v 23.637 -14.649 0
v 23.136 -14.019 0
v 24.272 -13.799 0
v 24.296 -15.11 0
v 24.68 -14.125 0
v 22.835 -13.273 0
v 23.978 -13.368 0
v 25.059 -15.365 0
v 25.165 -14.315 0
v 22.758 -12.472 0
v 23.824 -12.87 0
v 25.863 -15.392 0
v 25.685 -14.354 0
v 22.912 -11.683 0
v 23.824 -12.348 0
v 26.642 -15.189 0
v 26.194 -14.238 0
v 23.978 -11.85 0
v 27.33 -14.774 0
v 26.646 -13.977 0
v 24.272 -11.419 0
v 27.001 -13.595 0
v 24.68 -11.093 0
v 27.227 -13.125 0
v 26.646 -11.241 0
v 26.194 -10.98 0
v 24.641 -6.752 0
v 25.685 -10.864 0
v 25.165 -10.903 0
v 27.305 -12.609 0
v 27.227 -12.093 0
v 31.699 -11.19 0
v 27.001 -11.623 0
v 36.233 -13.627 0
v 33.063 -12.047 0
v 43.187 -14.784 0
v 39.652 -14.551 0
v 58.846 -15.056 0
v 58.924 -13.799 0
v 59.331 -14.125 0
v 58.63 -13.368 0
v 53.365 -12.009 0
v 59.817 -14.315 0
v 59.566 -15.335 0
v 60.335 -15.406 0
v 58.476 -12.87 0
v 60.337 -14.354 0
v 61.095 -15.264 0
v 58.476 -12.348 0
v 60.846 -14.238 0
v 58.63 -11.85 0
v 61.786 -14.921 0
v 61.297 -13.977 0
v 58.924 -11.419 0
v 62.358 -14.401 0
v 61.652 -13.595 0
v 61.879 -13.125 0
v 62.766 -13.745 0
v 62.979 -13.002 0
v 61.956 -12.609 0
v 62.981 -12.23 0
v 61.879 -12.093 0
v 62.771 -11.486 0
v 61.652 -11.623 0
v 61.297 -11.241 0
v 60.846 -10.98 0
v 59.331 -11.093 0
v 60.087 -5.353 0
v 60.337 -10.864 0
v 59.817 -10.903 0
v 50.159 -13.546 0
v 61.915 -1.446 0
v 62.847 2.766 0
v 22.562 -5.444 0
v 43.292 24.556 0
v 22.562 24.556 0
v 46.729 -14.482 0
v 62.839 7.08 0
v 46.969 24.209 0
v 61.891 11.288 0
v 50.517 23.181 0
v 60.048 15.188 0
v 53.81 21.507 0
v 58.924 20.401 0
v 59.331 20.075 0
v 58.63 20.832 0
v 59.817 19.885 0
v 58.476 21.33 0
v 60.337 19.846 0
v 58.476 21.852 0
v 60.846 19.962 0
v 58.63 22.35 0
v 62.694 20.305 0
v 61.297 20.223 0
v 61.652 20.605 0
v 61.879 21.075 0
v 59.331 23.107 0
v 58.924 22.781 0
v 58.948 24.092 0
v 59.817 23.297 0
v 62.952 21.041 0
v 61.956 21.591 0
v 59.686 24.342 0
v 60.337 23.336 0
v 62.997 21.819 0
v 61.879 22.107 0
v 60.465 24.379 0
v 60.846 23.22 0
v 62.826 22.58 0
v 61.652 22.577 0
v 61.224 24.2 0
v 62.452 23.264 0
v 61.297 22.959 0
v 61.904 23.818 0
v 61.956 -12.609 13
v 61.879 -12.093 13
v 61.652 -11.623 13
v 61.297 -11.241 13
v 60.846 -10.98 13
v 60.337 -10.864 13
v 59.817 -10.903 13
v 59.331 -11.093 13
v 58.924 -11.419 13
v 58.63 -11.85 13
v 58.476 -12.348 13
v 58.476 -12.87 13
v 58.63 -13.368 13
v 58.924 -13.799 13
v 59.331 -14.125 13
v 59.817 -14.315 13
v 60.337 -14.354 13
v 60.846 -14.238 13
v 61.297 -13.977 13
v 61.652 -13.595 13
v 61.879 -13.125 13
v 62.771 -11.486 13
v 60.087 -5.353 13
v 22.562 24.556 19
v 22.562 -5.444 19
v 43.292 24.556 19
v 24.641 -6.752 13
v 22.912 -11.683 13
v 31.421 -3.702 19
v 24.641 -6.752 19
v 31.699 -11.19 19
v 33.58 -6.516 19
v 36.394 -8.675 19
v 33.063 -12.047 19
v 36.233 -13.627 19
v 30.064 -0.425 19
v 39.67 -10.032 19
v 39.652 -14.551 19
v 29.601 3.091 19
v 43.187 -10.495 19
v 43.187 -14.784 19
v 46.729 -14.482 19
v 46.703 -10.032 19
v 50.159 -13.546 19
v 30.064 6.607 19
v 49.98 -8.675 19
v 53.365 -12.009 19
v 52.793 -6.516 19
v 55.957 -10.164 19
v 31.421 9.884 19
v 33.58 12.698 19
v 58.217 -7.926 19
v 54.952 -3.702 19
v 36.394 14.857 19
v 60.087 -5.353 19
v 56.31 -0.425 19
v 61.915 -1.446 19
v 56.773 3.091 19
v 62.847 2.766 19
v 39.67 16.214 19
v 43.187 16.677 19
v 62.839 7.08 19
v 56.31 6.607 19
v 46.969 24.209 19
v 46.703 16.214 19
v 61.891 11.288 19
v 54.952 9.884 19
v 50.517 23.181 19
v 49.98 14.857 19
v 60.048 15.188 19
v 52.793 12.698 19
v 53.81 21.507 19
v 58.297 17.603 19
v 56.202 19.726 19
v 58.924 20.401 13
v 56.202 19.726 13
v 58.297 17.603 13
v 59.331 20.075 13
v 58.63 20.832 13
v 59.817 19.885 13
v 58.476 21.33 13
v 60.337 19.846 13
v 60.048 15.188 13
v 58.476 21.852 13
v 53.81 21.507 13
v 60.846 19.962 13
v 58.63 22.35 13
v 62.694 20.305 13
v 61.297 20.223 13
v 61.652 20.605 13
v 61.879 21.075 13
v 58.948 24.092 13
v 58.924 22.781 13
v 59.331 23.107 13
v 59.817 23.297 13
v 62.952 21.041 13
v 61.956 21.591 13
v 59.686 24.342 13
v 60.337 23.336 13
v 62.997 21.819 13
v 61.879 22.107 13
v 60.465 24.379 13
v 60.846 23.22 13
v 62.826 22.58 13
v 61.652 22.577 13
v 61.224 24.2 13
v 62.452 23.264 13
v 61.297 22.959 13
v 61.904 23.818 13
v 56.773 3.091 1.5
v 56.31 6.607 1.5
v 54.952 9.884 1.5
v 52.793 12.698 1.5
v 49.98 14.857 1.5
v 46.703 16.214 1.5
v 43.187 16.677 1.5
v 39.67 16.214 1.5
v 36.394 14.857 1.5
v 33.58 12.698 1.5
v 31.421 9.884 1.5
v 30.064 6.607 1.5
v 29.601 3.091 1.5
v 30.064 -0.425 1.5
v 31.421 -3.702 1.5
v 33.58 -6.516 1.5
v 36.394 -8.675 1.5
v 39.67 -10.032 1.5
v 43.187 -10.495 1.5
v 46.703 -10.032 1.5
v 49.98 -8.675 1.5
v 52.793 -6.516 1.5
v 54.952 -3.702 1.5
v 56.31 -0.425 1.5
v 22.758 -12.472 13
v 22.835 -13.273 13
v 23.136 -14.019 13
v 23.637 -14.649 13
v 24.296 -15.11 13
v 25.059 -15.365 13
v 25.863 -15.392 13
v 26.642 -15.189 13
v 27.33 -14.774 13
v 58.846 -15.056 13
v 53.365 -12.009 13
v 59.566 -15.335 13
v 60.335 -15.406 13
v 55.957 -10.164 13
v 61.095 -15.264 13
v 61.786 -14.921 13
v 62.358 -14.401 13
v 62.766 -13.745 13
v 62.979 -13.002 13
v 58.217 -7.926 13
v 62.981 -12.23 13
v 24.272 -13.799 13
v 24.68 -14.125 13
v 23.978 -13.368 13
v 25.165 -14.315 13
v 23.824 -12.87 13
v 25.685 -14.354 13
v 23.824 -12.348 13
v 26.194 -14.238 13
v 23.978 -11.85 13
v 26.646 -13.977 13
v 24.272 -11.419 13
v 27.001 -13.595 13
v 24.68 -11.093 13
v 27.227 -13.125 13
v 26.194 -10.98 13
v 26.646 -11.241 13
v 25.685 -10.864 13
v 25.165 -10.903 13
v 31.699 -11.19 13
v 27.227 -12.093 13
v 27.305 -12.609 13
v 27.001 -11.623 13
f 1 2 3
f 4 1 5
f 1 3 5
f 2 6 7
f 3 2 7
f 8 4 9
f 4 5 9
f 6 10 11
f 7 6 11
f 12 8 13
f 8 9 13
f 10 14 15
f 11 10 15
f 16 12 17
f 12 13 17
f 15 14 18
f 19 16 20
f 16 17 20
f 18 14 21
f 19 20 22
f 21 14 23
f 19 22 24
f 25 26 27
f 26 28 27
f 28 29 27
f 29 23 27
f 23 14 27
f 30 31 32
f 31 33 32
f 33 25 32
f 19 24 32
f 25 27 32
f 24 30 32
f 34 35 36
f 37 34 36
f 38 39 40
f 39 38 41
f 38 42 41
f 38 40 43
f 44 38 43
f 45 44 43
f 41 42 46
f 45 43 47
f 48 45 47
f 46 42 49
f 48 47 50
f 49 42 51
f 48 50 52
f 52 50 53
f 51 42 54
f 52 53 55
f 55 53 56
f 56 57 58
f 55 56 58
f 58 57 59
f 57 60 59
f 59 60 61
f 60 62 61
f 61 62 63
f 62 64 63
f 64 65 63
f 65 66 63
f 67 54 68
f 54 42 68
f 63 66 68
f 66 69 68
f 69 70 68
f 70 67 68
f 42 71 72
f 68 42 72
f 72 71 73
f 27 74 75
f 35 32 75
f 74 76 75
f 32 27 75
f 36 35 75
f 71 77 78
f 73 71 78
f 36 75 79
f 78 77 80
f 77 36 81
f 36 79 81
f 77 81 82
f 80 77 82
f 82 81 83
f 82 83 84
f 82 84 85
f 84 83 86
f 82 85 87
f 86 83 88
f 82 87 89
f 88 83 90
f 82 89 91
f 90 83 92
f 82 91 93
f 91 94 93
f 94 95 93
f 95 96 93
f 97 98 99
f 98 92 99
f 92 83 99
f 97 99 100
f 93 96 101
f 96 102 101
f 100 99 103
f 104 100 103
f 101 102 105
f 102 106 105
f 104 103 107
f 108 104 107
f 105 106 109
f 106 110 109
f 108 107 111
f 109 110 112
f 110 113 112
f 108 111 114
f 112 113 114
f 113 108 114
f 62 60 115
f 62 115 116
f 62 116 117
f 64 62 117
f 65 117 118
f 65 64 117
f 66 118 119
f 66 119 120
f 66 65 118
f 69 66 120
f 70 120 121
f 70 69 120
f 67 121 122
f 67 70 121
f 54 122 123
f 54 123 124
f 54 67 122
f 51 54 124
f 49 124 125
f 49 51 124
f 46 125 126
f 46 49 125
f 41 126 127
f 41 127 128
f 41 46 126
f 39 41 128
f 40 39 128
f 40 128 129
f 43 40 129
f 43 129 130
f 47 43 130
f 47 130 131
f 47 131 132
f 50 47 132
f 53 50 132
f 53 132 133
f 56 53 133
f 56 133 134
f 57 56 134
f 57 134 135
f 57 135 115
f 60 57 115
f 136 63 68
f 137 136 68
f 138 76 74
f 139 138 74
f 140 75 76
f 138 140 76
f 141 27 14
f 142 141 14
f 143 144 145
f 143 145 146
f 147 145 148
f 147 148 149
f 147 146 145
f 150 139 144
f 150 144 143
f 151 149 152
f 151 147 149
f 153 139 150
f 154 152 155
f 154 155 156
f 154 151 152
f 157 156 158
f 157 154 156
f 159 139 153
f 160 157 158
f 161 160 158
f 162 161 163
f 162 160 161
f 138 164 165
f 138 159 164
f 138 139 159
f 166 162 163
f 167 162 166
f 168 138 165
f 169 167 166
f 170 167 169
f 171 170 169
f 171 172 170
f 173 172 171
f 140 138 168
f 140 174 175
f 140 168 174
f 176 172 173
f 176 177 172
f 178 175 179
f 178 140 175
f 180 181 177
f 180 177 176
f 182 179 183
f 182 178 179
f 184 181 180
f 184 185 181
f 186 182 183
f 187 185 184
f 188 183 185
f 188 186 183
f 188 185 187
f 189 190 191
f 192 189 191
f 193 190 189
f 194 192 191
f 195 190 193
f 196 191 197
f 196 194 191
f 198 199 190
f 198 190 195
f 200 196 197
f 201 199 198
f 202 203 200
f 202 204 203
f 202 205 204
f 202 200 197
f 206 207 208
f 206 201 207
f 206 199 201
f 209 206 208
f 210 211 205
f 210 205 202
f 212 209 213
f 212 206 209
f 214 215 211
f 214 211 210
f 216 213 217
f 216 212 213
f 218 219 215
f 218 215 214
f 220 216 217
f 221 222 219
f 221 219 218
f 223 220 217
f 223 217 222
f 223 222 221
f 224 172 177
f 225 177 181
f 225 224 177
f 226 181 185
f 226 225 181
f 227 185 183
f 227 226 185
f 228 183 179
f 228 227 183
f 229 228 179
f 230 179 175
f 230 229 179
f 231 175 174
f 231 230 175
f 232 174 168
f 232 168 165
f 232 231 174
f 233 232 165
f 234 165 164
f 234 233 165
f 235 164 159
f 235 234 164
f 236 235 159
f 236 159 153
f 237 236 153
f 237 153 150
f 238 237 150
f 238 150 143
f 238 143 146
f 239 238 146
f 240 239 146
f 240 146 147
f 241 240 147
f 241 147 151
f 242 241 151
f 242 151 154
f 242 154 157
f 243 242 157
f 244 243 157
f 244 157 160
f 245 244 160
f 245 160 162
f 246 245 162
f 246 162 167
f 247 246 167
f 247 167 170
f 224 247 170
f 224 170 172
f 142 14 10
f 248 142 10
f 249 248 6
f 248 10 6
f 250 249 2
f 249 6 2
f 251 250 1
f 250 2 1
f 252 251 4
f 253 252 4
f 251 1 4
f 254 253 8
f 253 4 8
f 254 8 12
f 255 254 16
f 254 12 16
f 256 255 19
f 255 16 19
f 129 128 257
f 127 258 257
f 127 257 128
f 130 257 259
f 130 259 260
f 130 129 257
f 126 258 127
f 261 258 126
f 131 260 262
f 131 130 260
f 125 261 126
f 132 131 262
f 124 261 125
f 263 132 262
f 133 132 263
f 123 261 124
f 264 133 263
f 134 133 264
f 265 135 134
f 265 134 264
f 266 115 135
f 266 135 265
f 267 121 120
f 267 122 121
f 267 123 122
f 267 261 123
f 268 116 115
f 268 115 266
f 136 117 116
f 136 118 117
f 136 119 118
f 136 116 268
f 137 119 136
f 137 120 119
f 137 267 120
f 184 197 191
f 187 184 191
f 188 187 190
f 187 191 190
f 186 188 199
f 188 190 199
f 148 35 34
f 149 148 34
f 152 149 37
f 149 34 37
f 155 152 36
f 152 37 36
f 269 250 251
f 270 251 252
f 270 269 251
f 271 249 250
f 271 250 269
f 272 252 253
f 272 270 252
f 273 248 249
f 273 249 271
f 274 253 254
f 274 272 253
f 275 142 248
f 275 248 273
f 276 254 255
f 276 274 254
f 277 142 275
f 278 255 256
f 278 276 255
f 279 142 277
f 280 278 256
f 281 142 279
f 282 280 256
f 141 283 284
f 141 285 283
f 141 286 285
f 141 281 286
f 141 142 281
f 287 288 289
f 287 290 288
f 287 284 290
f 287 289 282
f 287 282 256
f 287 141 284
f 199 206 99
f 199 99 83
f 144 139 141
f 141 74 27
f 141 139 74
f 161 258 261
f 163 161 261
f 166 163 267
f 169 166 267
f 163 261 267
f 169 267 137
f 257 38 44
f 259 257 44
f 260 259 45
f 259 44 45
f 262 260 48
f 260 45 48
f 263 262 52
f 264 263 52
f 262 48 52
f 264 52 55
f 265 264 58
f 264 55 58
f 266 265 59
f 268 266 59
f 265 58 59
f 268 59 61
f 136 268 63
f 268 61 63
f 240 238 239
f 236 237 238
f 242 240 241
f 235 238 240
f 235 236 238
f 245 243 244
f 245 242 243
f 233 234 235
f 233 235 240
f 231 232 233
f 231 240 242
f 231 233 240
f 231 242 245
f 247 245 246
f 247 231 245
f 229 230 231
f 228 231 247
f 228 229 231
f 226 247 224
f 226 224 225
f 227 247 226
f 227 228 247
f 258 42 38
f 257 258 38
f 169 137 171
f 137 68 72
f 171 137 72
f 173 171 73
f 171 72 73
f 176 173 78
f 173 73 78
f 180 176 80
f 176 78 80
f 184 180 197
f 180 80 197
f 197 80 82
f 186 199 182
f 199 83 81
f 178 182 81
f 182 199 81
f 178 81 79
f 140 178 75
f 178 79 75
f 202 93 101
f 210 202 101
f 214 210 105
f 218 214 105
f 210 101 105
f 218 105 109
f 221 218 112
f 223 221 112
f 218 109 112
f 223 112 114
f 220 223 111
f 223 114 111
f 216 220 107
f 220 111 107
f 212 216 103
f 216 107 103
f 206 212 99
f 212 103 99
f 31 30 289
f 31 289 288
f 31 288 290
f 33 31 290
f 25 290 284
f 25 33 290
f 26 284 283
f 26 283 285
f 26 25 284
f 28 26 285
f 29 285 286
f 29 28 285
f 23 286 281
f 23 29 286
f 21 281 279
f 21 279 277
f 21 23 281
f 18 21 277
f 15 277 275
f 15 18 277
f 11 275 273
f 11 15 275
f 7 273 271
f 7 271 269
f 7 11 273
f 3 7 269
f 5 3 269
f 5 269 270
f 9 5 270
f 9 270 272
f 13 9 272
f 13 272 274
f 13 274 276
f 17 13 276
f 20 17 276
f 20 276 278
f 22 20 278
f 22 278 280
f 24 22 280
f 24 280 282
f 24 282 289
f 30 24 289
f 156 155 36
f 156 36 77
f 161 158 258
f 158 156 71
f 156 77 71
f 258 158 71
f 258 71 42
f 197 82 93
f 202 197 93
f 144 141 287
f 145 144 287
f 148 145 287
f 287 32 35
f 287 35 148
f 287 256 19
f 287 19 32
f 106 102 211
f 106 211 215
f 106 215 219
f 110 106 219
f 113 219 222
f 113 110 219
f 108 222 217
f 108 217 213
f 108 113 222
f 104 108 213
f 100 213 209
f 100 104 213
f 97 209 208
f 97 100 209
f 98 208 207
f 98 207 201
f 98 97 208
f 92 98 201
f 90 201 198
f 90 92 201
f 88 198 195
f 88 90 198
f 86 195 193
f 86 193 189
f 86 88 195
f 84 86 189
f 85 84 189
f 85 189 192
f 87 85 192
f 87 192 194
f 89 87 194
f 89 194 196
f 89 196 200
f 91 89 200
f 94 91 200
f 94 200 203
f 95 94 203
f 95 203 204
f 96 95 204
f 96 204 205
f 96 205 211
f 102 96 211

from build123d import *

# Parameters (mm, degrees)
F0_R     = 13.586014
F0_R_2   = 1.75
F1_DEPTH = 1.5
F2_DEPTH = 13
F3_DEPTH = 19


with BuildPart() as f1:
    # F0 (on Top) → F1 (new body)
    with BuildSketch(Plane.XY):
        with BuildLine():
            Line((43.291877, 24.555553), (22.56174, 24.555553))
            Line((22.56174, 24.555553), (22.56174, -5.444447))
            Line((22.56174, -5.444447), (24.640569, -6.751582))
            Line((24.640569, -6.751582), (31.699486, -11.190116))
            Line((31.699486, -11.190116), (33.062977, -12.047457))
            ThreePointArc((33.062977, -12.047457), (37.919879, -14.173764), (43.186607, -14.783891))
            ThreePointArc((43.186607, -14.783891), (48.465497, -14.09159), (53.365348, -12.008945))
            ThreePointArc((53.365348, -12.008945), (57.132258, -9.090982), (60.086993, -5.352845))
            ThreePointArc((60.086993, -5.352845), (62.961704, 4.923251), (60.047767, 15.188294))
            ThreePointArc((60.047767, 15.188294), (57.289995, 18.70438), (53.809777, 21.507281))
            ThreePointArc((53.809777, 21.507281), (48.767235, 23.778121), (43.291877, 24.555553))
        make_face()
        with Locations((43.186607, 3.091027)):
            Circle(F0_R, mode=Mode.SUBTRACT)
        with Locations((43.186607, 3.091027)):
            Circle(F0_R)
        with BuildLine():
            Line((31.699486, -11.190116), (24.640569, -6.751582))
            Line((24.640569, -6.751582), (22.912271, -11.682871))
            ThreePointArc((22.912271, -11.682871), (23.949593, -14.903245), (27.330435, -14.773852))
            Line((27.330435, -14.773852), (31.699486, -11.190116))
        make_face()
        with Locations((25.554683, -12.608973)):
            Circle(F0_R_2, mode=Mode.SUBTRACT)
        with BuildLine():
            Line((62.771435, -11.486311), (60.086993, -5.352845))
            ThreePointArc((60.086993, -5.352845), (57.132258, -9.090982), (53.365348, -12.008945))
            Line((53.365348, -12.008945), (58.845684, -15.056129))
            ThreePointArc((58.845684, -15.056129), (62.090115, -14.680554), (62.771435, -11.486311))
        make_face()
        with Locations((60.206356, -12.608973)):
            Circle(F0_R_2, mode=Mode.SUBTRACT)
        with BuildLine():
            Line((58.947953, 24.092311), (53.809777, 21.507281))
            ThreePointArc((53.809777, 21.507281), (57.289995, 18.70438), (60.047767, 15.188294))
            Line((60.047767, 15.188294), (62.693522, 20.304946))
            ThreePointArc((62.693522, 20.304946), (62.197209, 23.559911), (58.947953, 24.092311))
        make_face()
        with Locations((60.206356, 21.591027)):
            Circle(F0_R_2, mode=Mode.SUBTRACT)
    extrude(amount=F1_DEPTH)

    # F0 (on Top) → F2 (join)
    with BuildSketch(Plane.XY):
        with BuildLine():
            Line((31.699486, -11.190116), (24.640569, -6.751582))
            Line((24.640569, -6.751582), (22.912271, -11.682871))
            ThreePointArc((22.912271, -11.682871), (23.949593, -14.903245), (27.330435, -14.773852))
            Line((27.330435, -14.773852), (31.699486, -11.190116))
        make_face()
        with Locations((25.554683, -12.608973)):
            Circle(F0_R_2, mode=Mode.SUBTRACT)
        with BuildLine():
            Line((62.771435, -11.486311), (60.086993, -5.352845))
            ThreePointArc((60.086993, -5.352845), (57.132258, -9.090982), (53.365348, -12.008945))
            Line((53.365348, -12.008945), (58.845684, -15.056129))
            ThreePointArc((58.845684, -15.056129), (62.090115, -14.680554), (62.771435, -11.486311))
        make_face()
        with Locations((60.206356, -12.608973)):
            Circle(F0_R_2, mode=Mode.SUBTRACT)
        with BuildLine():
            Line((58.947953, 24.092311), (53.809777, 21.507281))
            ThreePointArc((53.809777, 21.507281), (57.289995, 18.70438), (60.047767, 15.188294))
            Line((60.047767, 15.188294), (62.693522, 20.304946))
            ThreePointArc((62.693522, 20.304946), (62.197209, 23.559911), (58.947953, 24.092311))
        make_face()
        with Locations((60.206356, 21.591027)):
            Circle(F0_R_2, mode=Mode.SUBTRACT)
    extrude(amount=F2_DEPTH)

    # F0 (on Top) → F3 (join)
    with BuildSketch(Plane.XY):
        with BuildLine():
            Line((43.291877, 24.555553), (22.56174, 24.555553))
            Line((22.56174, 24.555553), (22.56174, -5.444447))
            Line((22.56174, -5.444447), (24.640569, -6.751582))
            Line((24.640569, -6.751582), (31.699486, -11.190116))
            Line((31.699486, -11.190116), (33.062977, -12.047457))
            ThreePointArc((33.062977, -12.047457), (37.919879, -14.173764), (43.186607, -14.783891))
            ThreePointArc((43.186607, -14.783891), (48.465497, -14.09159), (53.365348, -12.008945))
            ThreePointArc((53.365348, -12.008945), (57.132258, -9.090982), (60.086993, -5.352845))
            ThreePointArc((60.086993, -5.352845), (62.961704, 4.923251), (60.047767, 15.188294))
            ThreePointArc((60.047767, 15.188294), (57.289995, 18.70438), (53.809777, 21.507281))
            ThreePointArc((53.809777, 21.507281), (48.767235, 23.778121), (43.291877, 24.555553))
        make_face()
        with Locations((43.186607, 3.091027)):
            Circle(F0_R, mode=Mode.SUBTRACT)
    extrude(amount=F3_DEPTH)


solid = f1.part
